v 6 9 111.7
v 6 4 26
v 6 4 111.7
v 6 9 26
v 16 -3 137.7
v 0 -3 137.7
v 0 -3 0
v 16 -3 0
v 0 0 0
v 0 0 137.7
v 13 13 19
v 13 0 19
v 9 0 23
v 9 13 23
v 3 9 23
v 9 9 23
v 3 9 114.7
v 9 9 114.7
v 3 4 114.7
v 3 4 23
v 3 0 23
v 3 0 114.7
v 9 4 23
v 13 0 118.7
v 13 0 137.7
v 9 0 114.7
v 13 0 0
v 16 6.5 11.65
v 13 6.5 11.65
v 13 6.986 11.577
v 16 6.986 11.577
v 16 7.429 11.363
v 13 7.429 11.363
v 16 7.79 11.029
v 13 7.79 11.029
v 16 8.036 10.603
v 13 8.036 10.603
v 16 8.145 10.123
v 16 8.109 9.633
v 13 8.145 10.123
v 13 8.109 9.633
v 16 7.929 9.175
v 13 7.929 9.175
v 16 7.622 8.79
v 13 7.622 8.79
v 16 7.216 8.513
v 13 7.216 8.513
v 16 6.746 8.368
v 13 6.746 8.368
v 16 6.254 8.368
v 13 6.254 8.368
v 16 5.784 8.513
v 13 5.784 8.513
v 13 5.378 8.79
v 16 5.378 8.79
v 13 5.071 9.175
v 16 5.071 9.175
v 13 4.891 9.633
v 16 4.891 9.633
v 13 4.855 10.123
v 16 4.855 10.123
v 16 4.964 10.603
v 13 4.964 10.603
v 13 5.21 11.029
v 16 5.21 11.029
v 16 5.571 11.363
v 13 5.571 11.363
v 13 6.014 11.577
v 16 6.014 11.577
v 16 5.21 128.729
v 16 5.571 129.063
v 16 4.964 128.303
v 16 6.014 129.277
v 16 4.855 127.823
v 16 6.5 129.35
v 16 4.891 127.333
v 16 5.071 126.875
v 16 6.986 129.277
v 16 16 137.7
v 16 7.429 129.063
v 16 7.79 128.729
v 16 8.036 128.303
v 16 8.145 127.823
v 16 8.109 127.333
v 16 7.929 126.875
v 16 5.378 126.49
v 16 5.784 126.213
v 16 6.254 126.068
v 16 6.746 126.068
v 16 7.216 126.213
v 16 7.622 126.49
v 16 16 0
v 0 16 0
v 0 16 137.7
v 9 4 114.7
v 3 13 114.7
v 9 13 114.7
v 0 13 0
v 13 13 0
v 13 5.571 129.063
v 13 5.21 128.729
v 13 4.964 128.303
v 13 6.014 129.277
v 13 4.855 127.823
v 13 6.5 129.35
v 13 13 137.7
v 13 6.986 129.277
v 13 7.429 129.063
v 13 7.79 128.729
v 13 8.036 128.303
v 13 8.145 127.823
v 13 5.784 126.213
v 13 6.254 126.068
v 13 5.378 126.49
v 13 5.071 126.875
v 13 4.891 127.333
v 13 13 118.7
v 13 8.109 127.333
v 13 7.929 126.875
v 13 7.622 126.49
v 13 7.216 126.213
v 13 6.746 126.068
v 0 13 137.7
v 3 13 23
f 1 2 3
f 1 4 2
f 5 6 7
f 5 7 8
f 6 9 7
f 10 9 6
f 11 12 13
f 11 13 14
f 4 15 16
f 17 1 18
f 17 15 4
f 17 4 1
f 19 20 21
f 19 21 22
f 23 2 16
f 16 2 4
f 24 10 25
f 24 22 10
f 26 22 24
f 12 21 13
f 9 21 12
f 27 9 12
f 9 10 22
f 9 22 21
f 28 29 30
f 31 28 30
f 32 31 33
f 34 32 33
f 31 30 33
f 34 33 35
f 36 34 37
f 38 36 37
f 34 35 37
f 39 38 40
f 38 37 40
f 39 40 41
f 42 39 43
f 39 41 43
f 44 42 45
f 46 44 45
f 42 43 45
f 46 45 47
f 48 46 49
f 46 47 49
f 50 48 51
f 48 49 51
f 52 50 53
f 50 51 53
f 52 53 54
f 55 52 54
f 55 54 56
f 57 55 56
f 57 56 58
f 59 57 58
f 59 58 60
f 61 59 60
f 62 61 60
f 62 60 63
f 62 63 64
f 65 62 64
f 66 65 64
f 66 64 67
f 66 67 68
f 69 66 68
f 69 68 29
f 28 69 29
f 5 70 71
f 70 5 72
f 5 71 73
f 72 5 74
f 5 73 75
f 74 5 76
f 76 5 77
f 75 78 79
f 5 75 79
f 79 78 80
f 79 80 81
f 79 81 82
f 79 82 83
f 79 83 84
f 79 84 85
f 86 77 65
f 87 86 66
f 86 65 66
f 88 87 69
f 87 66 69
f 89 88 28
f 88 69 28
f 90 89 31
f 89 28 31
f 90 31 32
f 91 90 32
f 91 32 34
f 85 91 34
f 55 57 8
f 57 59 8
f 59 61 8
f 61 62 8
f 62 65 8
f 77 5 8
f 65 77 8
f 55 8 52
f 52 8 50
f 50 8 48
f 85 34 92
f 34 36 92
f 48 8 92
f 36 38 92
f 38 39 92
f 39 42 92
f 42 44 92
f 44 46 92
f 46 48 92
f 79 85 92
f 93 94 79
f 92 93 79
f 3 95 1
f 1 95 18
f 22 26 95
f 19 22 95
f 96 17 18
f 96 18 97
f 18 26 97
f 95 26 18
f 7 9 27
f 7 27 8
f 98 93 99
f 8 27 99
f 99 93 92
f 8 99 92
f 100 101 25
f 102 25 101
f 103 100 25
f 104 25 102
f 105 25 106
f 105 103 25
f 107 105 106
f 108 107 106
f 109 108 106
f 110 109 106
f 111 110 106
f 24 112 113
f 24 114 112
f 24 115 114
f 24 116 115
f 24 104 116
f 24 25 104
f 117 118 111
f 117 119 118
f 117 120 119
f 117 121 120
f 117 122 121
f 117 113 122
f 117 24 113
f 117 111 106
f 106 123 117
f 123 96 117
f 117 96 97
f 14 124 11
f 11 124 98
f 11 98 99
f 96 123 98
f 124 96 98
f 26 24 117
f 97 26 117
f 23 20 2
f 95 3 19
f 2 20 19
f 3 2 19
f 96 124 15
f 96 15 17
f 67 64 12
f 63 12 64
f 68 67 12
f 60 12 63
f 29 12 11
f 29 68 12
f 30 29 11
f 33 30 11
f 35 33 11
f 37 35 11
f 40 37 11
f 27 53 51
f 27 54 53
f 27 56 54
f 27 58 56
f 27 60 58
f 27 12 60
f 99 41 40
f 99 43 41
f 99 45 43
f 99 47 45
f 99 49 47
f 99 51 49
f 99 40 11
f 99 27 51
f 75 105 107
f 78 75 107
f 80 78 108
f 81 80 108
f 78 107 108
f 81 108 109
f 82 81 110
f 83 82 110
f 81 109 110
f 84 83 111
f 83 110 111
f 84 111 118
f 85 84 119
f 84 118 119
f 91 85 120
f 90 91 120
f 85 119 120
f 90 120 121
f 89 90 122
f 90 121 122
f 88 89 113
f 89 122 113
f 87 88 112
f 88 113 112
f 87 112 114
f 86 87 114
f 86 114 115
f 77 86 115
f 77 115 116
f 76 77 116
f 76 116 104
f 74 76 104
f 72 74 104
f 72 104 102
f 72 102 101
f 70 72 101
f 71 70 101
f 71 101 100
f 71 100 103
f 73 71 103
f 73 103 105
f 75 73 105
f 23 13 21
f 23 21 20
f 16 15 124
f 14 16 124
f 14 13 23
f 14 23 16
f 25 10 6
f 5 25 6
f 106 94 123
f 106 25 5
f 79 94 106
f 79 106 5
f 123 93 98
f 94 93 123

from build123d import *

# Parameters (mm, degrees)
SKETCH_1_W          = 19
SKETCH_1_H          = 19
SKETCH_1_W_2        = 13
SKETCH_1_H_2        = 13
EXTRUDE_1_DEPTH     = 137.7
SKETCH_2_R          = 1.65
CUT_EXTRUDE_1_DEPTH = 30
SKETCH_3_W          = 184.332972064
SKETCH_3_H          = 39.863215684
CUT_EXTRUDE_2_DEPTH = 3
SKETCH_4_W          = 5
SKETCH_4_H          = 13
EXTRUDE_1_2_DEPTH   = 10
SKETCH_5_W          = 81.7
SKETCH_5_H          = 5
EXTRUDE_2_DEPTH     = 10
SKETCH_6_W          = 91.7
SKETCH_6_H          = 13
EXTRUDE_3_DEPTH     = 10
SKETCH_8_W          = 91.7
SKETCH_8_H          = 5
CUT_EXTRUDE_3_DEPTH = 3
CHAMFER_1_SIZE      = 3
CHAMFER_2_SIZE      = 4


with BuildPart() as part:
    # 草图1 → Extrude 1 (new body)
    with BuildSketch(Plane.XY):
        with Locations((6.5, 6.5)):
            Rectangle(SKETCH_1_W, SKETCH_1_H)
        with Locations((6.5, 6.5)):
            Rectangle(SKETCH_1_W_2, SKETCH_1_H_2, mode=Mode.SUBTRACT)
    extrude(amount=EXTRUDE_1_DEPTH)

    # 草图2 → 切除-拉伸1 (cut)
    with BuildSketch(Plane.ZY.offset(3)):
        with Locations((10, 6.5)):
            Circle(SKETCH_2_R)
        with Locations((127.7, 6.5)):
            Circle(SKETCH_2_R)
    extrude(amount=-CUT_EXTRUDE_1_DEPTH, mode=Mode.SUBTRACT)

    # 草图3 → 切除-拉伸2 (cut)
    with BuildSketch(Plane.ZY.offset(3)):
        with Locations((86.871134348, 3.380889782)):
            Rectangle(SKETCH_3_W, SKETCH_3_H)
    extrude(amount=-CUT_EXTRUDE_2_DEPTH, mode=Mode.SUBTRACT)

    # 草图4 → Extrude 1 2 (add)
    with BuildSketch(Plane.ZY.offset(-13)):
        with Locations((25.5, 6.5)):
            Rectangle(SKETCH_4_W, SKETCH_4_H)
        with Locations((112.2, 6.5)):
            Rectangle(SKETCH_4_W, SKETCH_4_H)
    extrude(amount=EXTRUDE_1_2_DEPTH)

    # 草图5 → 凸台-拉伸2 (add)
    with BuildSketch(Plane.ZY.offset(-13)):
        with Locations((68.85, 6.5)):
            Rectangle(SKETCH_5_W, SKETCH_5_H)
    extrude(amount=EXTRUDE_2_DEPTH)

    # 草图6 → 凸台-拉伸3 (add)
    with BuildSketch(Plane.ZY.offset(-13)):
        with Locations((68.85, 6.5)):
            Rectangle(SKETCH_6_W, SKETCH_6_H)
    extrude(amount=EXTRUDE_3_DEPTH)

    # 草图8 → 切除-拉伸3 (cut)
    with BuildSketch(Plane.ZY.offset(-3)):
        with Locations((68.85, 6.5)):
            Rectangle(SKETCH_8_W, SKETCH_8_H)
    extrude(amount=-CUT_EXTRUDE_3_DEPTH, mode=Mode.SUBTRACT)

    # 倒角1
    chamfer_1_edges = [part.edges().sort_by_distance(p)[0] for p in [
        (6, 6.5, 23),
        (6, 6.5, 114.7),
    ]]
    chamfer(chamfer_1_edges, length=CHAMFER_1_SIZE)

    # 倒角2
    chamfer_2_edges = [part.edges().sort_by_distance(p)[0] for p in [
        (13, 6.5, 23),
        (13, 6.5, 114.7),
    ]]
    chamfer(chamfer_2_edges, length=CHAMFER_2_SIZE - 0.0001)  # a hair under: the kernel refuses the full size


solid = part.part
